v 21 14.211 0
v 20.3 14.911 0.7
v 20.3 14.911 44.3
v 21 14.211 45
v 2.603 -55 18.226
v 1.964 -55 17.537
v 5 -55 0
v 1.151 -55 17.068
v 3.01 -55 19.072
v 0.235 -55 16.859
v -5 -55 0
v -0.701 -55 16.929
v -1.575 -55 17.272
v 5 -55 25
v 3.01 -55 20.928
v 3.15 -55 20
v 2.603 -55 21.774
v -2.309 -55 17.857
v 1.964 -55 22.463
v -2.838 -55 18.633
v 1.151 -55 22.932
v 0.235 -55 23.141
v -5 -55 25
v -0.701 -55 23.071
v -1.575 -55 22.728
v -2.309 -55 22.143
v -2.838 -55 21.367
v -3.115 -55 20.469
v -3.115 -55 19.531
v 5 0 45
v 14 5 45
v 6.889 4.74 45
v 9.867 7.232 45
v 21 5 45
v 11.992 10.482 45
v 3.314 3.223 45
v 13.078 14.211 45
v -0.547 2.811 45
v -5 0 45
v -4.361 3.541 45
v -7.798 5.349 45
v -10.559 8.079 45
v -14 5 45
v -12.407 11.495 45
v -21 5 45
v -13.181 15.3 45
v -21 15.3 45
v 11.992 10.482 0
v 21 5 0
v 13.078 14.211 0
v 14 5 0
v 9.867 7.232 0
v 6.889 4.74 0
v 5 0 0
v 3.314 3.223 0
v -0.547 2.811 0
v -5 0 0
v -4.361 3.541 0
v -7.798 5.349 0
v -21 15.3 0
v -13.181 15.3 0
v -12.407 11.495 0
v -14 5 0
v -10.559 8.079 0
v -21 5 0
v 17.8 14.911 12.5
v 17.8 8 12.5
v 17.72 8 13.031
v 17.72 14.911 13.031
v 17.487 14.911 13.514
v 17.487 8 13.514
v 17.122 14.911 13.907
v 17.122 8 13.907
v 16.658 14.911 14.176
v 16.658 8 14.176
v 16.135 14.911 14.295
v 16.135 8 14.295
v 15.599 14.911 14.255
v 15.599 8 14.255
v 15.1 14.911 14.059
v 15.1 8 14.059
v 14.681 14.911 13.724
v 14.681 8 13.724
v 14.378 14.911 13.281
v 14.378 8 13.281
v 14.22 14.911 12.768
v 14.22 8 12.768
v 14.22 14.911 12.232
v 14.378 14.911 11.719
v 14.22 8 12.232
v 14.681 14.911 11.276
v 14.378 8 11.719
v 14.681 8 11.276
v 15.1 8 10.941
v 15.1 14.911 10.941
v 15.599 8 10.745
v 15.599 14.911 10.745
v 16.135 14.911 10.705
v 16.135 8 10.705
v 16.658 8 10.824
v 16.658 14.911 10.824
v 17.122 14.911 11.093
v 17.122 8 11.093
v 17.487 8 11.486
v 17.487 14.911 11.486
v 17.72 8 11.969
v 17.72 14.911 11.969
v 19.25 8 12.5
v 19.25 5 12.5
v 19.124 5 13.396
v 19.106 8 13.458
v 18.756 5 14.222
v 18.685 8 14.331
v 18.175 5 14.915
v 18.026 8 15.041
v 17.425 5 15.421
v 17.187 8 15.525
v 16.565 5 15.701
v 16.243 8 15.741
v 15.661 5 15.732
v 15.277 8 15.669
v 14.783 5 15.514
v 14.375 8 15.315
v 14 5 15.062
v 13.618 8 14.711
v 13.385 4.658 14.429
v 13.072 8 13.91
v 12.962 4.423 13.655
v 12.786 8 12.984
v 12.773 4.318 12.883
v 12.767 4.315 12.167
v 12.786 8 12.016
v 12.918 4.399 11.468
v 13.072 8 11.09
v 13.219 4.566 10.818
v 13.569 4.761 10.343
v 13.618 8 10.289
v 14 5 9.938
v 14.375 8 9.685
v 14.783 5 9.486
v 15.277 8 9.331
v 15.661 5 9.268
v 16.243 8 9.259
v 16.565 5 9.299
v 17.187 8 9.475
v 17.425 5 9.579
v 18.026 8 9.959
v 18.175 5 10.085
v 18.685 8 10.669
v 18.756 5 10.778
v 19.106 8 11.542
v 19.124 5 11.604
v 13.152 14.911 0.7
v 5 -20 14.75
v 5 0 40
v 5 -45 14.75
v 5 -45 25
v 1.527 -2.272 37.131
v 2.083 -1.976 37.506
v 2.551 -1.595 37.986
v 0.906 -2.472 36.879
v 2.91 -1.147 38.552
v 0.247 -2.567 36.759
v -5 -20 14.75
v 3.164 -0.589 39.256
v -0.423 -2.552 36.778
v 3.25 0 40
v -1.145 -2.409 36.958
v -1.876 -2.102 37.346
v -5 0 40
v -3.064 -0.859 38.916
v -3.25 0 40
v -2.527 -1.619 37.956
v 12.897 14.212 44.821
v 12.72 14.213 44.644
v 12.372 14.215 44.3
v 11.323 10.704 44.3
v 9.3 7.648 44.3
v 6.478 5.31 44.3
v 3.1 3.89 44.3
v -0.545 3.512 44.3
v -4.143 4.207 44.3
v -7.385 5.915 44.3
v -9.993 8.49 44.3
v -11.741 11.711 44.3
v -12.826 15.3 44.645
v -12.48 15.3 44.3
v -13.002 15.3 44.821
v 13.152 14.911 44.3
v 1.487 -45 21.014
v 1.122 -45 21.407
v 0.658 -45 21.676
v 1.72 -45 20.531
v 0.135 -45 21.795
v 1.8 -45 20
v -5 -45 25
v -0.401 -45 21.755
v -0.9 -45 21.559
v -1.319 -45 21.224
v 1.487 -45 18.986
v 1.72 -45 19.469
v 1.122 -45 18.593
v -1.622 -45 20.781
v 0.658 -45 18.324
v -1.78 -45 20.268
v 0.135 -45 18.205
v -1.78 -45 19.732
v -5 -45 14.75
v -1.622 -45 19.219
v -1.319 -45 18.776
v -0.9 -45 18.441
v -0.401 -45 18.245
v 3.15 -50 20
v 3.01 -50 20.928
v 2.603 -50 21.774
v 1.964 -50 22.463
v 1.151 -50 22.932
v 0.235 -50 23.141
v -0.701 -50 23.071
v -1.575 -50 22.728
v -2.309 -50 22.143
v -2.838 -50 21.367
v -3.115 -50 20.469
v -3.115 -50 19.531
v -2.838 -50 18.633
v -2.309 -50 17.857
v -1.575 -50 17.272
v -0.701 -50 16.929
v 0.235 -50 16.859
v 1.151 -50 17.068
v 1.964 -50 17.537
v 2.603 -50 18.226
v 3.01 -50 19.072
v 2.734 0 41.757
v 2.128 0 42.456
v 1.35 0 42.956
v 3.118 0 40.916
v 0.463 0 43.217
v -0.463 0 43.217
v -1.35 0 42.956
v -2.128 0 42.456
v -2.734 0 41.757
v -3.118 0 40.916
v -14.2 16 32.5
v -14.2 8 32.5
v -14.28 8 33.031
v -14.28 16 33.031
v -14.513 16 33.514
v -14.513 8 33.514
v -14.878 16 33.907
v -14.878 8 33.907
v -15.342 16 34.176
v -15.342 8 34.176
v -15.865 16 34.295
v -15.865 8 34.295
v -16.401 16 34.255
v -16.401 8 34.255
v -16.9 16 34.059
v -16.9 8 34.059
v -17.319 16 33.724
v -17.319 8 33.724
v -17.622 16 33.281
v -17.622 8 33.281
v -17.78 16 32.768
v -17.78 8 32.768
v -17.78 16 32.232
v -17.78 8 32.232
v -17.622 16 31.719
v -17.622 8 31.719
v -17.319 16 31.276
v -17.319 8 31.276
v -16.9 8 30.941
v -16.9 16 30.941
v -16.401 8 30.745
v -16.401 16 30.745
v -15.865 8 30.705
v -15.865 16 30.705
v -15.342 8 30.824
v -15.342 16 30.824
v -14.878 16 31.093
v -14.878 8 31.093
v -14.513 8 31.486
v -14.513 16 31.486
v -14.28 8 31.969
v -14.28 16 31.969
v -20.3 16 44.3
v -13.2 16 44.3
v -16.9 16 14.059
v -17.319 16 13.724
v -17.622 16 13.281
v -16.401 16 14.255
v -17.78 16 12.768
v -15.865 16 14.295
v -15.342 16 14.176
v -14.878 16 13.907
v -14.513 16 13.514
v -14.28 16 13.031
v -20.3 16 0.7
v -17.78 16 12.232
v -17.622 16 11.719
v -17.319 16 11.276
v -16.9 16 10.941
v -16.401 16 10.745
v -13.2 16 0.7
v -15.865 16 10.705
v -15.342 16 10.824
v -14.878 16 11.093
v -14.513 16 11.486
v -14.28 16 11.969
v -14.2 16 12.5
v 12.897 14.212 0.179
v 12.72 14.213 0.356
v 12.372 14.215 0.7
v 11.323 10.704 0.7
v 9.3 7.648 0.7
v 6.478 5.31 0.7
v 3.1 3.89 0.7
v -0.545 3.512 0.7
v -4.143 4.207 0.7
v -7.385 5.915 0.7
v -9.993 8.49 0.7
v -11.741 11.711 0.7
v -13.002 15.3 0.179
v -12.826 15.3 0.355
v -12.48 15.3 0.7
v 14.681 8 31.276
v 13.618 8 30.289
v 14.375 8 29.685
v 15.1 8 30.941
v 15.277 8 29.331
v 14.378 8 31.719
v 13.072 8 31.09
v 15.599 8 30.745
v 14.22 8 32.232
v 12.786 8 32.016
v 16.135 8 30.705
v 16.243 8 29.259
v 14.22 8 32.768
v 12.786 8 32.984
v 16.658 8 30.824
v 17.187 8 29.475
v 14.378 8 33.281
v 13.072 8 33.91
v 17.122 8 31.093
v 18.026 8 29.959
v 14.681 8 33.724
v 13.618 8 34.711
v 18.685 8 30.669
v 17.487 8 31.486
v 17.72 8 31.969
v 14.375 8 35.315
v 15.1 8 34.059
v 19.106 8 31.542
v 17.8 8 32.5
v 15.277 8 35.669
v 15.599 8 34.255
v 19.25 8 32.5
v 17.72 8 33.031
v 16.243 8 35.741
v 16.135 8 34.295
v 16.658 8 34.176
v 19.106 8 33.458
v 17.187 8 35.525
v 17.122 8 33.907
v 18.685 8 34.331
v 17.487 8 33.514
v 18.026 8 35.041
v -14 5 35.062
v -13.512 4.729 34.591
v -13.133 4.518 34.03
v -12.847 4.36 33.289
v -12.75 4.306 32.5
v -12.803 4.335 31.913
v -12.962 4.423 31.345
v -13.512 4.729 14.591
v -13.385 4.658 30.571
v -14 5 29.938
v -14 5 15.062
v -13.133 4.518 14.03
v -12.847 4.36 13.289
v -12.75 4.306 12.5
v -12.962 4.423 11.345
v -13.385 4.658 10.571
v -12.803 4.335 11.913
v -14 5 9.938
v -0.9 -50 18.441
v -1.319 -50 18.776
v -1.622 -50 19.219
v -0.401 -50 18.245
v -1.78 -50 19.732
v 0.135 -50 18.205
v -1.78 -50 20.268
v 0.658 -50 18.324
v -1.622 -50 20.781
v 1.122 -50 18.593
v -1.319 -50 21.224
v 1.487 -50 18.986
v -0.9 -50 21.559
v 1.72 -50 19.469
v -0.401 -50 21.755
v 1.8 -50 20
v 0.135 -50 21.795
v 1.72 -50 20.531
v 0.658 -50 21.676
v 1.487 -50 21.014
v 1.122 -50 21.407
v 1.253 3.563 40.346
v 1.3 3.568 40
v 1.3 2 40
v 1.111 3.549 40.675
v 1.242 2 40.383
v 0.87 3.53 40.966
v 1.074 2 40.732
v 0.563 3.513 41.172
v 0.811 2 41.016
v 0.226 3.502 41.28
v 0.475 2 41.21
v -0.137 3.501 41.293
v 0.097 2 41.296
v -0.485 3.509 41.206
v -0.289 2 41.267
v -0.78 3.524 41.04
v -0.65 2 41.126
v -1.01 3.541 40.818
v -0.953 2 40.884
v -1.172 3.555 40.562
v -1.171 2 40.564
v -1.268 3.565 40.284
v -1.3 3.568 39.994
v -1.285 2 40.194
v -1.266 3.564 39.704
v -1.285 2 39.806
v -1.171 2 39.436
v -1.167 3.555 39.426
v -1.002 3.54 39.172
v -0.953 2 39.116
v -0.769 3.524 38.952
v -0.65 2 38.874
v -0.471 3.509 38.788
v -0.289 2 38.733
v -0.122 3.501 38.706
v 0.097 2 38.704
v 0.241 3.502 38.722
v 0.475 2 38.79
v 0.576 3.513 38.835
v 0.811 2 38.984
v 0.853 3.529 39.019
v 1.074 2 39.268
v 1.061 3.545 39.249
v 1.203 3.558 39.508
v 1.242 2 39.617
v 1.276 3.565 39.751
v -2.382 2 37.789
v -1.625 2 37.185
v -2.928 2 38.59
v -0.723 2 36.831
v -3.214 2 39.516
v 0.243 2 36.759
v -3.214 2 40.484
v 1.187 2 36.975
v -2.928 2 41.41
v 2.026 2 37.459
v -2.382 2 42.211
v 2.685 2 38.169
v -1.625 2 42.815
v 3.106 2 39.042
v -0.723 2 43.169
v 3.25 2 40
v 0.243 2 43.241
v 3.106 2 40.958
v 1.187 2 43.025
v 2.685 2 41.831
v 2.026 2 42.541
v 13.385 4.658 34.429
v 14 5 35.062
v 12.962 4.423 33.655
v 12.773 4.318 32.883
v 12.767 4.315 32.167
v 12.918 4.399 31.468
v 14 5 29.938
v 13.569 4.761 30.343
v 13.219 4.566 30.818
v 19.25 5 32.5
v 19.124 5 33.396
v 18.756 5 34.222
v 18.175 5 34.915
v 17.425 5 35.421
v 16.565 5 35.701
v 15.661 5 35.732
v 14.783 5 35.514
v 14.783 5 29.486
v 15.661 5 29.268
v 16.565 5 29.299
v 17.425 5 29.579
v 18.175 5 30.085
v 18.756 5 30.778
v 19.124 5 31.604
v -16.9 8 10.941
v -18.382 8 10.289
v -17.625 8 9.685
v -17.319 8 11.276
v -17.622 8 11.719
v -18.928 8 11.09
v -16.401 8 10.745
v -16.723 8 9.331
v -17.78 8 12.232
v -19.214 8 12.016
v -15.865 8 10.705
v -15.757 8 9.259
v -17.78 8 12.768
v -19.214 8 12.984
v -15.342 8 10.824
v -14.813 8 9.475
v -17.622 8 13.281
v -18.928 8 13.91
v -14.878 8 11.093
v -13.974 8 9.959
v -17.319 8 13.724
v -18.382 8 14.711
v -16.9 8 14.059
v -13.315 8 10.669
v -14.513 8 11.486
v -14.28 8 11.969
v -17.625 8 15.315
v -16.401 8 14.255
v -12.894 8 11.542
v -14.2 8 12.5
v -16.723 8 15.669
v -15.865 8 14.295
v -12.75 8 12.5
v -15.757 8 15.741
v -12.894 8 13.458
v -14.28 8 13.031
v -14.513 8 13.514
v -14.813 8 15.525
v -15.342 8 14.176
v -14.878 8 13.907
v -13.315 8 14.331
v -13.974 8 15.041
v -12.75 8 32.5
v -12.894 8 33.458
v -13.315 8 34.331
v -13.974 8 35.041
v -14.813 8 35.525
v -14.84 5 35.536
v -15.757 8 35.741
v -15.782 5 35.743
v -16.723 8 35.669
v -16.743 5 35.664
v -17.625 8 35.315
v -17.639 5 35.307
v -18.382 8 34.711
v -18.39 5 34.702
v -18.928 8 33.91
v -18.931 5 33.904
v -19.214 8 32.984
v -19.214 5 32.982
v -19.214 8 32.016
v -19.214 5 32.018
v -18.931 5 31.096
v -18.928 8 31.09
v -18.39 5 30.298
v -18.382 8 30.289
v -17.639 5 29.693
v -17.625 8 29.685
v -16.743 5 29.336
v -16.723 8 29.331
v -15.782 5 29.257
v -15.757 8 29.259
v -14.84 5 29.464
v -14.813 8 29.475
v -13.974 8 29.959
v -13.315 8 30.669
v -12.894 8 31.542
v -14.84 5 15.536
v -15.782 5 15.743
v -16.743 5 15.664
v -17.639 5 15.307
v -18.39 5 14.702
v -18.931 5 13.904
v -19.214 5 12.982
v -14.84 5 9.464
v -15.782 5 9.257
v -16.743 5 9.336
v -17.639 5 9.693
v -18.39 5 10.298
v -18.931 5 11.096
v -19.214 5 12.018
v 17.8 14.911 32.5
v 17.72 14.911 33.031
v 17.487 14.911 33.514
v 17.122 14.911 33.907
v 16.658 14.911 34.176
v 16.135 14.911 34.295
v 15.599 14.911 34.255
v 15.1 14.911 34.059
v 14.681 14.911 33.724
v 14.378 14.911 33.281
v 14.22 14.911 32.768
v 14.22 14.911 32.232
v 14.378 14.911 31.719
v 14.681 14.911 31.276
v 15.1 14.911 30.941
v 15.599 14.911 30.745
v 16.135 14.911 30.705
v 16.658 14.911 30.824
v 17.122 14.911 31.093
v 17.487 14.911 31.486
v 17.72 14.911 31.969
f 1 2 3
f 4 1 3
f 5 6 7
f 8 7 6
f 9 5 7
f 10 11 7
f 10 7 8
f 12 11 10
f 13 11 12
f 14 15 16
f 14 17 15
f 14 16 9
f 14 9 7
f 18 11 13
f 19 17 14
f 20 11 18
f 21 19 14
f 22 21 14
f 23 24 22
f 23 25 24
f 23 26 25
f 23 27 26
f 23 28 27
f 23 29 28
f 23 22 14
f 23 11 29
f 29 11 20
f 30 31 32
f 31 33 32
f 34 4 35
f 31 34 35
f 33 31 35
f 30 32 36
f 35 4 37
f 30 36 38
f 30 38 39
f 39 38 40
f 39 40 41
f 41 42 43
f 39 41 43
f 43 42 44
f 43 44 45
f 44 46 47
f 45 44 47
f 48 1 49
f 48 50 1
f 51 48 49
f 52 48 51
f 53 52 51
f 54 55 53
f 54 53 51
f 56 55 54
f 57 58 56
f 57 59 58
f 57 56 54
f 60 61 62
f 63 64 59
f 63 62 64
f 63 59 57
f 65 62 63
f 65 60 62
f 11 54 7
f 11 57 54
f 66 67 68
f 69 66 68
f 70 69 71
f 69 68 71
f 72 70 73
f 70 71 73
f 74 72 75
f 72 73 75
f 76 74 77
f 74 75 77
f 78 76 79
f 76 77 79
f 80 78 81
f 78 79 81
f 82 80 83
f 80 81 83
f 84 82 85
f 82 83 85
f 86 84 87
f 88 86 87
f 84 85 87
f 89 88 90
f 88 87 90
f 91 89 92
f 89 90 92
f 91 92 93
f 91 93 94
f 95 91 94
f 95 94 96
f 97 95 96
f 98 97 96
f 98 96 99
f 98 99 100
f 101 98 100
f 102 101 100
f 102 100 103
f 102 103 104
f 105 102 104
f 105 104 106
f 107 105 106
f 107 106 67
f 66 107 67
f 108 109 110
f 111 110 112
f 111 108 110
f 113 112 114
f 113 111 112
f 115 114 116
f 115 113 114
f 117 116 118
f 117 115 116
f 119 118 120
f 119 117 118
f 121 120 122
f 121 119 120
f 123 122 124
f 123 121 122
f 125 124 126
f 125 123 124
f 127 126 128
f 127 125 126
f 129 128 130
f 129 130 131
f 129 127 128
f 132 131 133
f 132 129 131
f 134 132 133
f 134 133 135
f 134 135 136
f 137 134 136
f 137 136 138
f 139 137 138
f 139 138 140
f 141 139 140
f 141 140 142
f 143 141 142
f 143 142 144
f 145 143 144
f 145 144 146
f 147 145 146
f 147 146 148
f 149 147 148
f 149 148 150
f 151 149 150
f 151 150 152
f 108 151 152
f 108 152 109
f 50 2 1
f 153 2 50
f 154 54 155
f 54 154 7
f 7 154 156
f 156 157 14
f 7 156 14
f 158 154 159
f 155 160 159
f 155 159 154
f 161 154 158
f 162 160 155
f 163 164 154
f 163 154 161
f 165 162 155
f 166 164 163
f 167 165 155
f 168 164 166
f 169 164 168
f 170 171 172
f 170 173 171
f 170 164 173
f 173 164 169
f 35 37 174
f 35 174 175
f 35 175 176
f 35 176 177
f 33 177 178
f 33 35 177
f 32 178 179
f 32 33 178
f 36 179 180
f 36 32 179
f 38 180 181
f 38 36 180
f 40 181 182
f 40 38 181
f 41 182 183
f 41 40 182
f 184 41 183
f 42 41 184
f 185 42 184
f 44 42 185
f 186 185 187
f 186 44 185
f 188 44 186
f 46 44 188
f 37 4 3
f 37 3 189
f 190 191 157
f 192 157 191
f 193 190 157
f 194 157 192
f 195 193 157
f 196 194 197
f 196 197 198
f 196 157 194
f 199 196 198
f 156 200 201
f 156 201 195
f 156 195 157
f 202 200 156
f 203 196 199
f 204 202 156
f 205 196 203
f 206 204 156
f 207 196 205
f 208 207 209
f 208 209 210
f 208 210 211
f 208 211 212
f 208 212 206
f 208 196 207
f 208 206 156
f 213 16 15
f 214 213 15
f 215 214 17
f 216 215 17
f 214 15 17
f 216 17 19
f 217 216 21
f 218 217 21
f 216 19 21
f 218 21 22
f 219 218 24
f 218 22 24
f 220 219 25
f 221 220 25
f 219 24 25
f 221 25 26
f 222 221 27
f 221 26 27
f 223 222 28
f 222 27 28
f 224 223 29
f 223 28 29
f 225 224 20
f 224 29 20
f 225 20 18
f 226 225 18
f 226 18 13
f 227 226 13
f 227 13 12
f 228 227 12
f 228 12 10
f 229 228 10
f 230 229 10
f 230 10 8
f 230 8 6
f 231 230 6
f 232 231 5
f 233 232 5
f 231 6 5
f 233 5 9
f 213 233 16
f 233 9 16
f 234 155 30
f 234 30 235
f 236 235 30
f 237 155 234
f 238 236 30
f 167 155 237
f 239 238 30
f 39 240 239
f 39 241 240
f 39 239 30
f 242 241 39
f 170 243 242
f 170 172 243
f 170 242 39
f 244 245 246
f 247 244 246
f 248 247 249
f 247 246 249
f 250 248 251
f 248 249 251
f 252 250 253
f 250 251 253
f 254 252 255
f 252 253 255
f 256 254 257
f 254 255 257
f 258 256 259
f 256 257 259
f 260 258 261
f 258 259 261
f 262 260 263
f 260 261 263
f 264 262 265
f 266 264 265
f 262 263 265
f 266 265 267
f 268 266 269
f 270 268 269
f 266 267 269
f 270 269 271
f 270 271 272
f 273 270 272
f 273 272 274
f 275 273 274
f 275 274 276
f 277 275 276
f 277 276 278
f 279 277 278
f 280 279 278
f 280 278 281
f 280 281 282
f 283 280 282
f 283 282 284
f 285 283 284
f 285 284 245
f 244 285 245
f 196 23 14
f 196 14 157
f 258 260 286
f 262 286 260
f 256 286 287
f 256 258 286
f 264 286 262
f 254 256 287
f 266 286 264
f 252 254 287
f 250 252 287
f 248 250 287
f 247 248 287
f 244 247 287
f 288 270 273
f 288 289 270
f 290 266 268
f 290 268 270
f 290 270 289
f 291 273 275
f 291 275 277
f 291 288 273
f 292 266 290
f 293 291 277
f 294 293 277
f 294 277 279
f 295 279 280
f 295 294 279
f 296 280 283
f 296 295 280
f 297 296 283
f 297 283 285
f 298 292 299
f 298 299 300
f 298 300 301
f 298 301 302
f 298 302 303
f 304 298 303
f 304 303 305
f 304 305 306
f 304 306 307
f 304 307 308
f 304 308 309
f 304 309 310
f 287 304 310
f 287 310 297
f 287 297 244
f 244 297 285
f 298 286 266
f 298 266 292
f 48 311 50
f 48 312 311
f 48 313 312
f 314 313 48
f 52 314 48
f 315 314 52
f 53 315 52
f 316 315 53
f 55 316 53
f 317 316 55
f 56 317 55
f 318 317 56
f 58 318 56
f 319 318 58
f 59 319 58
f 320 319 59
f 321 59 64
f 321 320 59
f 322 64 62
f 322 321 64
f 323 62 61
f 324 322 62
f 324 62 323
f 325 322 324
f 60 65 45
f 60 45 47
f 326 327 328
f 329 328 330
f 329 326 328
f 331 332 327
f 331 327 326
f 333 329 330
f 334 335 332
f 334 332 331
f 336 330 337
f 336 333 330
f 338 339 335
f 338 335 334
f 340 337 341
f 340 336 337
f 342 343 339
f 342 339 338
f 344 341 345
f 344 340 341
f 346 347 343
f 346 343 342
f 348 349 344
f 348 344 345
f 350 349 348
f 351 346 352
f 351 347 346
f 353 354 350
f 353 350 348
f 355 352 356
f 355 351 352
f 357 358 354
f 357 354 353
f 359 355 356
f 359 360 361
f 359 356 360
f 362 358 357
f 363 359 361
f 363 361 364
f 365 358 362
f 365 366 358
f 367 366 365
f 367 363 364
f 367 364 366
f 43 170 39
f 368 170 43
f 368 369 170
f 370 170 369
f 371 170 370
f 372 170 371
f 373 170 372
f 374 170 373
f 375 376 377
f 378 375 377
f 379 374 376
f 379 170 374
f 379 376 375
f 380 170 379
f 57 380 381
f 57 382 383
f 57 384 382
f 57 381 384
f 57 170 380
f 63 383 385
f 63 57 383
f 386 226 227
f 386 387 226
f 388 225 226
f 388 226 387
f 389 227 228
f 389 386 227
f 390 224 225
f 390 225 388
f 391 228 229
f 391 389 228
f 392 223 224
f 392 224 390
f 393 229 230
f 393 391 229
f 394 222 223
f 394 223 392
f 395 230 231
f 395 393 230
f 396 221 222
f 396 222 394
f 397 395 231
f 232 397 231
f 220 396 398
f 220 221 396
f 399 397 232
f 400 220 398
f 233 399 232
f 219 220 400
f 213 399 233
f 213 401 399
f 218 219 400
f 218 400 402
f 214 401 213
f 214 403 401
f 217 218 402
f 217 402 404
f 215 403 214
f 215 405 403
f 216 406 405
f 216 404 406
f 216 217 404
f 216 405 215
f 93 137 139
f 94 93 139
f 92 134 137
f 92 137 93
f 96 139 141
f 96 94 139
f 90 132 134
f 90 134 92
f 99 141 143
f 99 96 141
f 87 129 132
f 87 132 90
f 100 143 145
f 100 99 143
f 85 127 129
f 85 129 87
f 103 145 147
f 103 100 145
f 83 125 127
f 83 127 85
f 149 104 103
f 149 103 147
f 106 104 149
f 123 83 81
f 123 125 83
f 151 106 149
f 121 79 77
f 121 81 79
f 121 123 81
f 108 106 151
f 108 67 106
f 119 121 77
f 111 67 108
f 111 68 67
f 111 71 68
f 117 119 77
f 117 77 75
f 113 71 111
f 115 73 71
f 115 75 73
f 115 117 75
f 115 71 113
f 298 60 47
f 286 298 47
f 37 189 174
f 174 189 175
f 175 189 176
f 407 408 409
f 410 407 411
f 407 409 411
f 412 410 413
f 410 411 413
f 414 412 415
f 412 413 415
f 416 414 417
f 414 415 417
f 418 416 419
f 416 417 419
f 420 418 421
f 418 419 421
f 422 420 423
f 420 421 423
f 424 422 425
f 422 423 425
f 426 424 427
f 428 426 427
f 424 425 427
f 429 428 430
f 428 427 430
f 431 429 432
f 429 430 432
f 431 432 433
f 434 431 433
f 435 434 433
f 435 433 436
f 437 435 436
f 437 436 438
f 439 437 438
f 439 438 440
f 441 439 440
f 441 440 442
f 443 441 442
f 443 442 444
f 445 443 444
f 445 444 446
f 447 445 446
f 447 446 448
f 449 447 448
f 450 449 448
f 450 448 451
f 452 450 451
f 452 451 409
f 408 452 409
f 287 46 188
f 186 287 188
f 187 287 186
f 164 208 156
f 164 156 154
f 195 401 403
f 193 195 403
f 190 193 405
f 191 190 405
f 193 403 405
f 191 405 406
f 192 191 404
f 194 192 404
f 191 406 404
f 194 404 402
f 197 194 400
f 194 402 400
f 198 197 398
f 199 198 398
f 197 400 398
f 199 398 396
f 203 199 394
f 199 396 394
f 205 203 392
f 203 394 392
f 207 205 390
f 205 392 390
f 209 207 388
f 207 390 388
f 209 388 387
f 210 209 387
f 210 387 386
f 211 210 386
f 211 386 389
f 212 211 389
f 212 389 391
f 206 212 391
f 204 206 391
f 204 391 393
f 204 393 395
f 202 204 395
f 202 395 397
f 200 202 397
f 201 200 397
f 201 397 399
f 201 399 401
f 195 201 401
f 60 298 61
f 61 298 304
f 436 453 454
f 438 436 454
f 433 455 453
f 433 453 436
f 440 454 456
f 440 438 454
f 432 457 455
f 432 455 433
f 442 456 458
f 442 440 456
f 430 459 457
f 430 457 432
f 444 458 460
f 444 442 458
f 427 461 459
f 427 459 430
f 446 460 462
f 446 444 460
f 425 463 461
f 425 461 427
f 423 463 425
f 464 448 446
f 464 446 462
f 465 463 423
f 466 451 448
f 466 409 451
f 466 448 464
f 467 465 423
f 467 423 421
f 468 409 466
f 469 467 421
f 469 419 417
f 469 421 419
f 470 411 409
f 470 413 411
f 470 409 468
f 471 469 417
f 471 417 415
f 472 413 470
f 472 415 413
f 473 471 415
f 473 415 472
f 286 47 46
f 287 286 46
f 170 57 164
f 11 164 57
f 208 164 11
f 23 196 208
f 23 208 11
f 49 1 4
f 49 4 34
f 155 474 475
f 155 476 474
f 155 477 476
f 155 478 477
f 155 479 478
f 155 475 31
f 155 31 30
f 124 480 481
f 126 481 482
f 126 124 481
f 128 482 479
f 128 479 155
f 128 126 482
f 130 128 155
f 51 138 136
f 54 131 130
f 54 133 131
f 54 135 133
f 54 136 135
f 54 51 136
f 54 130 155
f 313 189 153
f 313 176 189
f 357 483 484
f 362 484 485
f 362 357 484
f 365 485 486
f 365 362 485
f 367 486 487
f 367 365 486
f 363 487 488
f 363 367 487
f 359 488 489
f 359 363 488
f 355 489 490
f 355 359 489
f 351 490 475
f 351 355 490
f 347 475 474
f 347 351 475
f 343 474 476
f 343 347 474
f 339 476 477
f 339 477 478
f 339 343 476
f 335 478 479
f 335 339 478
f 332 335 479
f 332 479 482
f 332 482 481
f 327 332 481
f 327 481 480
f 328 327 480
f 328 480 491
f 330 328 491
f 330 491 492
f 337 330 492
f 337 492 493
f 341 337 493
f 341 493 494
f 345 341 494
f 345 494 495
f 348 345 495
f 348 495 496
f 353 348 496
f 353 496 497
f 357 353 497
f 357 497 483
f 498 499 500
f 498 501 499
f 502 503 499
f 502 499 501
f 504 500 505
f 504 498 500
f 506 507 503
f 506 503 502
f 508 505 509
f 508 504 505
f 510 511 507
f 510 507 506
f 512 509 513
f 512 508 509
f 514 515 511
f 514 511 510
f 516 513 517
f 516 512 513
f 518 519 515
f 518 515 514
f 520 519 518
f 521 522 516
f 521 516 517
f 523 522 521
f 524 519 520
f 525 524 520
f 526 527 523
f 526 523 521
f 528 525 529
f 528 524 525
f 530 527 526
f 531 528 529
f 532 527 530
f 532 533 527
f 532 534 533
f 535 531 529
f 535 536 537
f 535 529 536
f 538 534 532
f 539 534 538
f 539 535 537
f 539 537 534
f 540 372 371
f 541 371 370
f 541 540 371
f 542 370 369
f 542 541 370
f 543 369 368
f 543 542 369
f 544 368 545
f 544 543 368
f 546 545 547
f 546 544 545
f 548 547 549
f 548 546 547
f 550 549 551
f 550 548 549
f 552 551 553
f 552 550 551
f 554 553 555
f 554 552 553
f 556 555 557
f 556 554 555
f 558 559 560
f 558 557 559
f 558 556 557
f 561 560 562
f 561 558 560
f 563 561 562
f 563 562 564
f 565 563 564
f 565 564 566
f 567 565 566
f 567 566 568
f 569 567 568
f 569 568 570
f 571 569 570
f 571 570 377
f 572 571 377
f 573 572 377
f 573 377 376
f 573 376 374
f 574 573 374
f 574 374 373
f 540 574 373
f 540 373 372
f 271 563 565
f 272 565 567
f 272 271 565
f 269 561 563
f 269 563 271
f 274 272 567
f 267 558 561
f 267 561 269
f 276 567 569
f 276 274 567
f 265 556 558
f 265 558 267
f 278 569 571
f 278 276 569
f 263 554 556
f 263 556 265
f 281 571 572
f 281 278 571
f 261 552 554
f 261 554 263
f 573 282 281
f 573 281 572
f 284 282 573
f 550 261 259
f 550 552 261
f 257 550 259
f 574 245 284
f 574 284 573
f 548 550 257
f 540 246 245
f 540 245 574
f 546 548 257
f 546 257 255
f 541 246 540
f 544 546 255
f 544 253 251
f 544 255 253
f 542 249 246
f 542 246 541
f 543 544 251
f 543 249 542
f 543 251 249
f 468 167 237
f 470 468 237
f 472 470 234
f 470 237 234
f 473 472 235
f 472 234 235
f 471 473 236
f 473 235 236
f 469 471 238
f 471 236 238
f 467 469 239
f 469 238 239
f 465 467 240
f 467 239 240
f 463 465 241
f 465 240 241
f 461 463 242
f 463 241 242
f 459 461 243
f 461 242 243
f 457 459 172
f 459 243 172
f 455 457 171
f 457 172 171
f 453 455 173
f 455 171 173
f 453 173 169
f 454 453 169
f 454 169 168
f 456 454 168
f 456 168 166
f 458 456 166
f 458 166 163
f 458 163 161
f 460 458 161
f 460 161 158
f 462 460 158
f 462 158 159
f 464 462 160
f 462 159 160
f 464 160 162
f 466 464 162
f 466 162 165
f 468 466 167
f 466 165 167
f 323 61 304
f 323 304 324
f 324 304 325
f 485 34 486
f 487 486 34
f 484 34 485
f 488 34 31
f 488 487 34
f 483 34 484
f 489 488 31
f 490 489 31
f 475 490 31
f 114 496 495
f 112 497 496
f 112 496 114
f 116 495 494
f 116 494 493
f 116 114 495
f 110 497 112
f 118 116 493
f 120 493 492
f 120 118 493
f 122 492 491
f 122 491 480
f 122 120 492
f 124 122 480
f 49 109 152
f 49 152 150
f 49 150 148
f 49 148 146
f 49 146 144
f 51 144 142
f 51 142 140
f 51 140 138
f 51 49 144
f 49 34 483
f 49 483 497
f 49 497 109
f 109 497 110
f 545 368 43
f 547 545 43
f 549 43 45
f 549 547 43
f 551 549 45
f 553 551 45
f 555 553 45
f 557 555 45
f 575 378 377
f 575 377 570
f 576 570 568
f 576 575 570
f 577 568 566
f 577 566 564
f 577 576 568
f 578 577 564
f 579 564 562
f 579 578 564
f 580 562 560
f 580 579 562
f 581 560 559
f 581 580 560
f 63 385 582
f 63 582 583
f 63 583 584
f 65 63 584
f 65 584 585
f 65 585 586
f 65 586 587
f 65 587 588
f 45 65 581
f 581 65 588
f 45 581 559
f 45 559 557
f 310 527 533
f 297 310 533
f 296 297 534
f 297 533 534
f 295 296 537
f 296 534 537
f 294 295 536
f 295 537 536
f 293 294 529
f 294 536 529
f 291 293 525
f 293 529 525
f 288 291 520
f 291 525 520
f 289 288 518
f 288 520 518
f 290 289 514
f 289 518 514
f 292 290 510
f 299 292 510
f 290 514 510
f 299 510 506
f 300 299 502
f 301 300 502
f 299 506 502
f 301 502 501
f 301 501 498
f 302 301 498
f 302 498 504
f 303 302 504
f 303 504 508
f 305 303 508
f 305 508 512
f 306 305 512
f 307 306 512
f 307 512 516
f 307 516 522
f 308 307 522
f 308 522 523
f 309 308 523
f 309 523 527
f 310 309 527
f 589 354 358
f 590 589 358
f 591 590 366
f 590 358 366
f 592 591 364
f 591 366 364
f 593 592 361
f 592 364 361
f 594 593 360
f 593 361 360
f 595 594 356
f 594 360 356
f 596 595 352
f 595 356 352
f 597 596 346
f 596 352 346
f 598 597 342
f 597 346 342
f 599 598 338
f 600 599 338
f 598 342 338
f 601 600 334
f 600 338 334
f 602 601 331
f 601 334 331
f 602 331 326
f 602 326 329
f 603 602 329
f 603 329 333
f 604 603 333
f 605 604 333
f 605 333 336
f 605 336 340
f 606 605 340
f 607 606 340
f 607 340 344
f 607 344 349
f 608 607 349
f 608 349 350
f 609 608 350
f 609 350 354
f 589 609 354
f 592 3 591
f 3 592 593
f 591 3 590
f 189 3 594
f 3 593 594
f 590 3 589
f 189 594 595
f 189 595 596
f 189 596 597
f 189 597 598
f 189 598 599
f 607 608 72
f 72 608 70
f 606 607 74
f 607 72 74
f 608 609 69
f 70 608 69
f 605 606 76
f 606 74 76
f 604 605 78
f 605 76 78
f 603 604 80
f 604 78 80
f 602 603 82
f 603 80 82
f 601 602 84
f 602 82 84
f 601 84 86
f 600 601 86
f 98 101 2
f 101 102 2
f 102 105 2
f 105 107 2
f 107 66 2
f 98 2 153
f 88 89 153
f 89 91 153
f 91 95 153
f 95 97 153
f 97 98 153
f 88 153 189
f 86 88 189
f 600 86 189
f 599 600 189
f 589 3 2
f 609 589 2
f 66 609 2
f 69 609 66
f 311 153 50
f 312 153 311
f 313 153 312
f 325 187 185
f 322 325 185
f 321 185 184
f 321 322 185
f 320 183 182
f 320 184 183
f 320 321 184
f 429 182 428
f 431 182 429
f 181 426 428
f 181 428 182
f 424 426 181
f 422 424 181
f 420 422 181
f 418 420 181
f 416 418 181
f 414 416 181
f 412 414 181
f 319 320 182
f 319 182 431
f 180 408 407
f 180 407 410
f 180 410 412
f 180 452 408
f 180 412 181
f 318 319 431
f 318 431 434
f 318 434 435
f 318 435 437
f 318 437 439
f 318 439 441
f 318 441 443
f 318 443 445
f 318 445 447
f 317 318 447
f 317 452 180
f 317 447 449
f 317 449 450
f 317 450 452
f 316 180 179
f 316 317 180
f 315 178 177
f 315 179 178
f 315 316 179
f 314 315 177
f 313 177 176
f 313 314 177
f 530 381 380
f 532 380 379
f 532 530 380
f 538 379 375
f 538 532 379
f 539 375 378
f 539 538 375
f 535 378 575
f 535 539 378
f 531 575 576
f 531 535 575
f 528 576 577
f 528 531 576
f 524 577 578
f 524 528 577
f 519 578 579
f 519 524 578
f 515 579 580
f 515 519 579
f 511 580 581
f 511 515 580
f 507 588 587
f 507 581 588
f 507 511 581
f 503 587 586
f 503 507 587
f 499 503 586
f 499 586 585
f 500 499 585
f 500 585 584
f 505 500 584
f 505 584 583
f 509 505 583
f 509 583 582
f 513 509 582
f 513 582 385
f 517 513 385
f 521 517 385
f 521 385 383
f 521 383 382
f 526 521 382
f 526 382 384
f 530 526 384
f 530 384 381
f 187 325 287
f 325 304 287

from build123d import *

# Parameters (mm, degrees)
SKETCH018_AS_DRAWN_R                 = 3.15
EXTRUDE021_DEPTH                     = 5
EXTRUDE021_ONTO_SKETCH018_ROLL_ANGLE = 90
SKETCH007_AS_DRAWN_R                 = 1.8
EXTRUDE020_DEPTH                     = 15
EXTRUDE020_ONTO_SKETCH007_ROLL_ANGLE = 90
SKETCH005_AS_DRAWN_R                 = 1.8
SKETCH005_AS_DRAWN_R_2               = 1.3
EXTRUDE008_DEPTH                     = 40
EXTRUDE008_ONTO_SKETCH005_ROLL_ANGLE = 90
SKETCH006_AS_DRAWN_R                 = 3.25
EXTRUDE009_DEPTH                     = 4
EXTRUDE009_ONTO_SKETCH006_ROLL_ANGLE = 90
SKETCH019_AS_DRAWN_R                 = 3.25
EXTRUDE022_DEPTH                     = 10
EXTRUDE022_ONTO_SKETCH019_ROLL_ANGLE = 90
SKETCH004_R                          = 12.5
EXTRUDE007_DEPTH                     = 60
EXTRUDE001_DEPTH                     = 10
EXTRUDE_DEPTH                        = 45
CHAMFER_SIZE                         = 0.7


with BuildPart() as extrude021:
    # Sketch018 as drawn → Extrude021 (new)
    with BuildSketch(Plane.XY):
        with Locations((0, 20)):
            Circle(SKETCH018_AS_DRAWN_R)
    extrude(amount=-EXTRUDE021_DEPTH)


with BuildPart() as extrude021_1:
    # Extrude021 onto Sketch018 roll: moved
    add(extrude021.part.rotate(Axis((0, 0, 0), (1, 0, 0)), EXTRUDE021_ONTO_SKETCH018_ROLL_ANGLE))


with BuildPart() as extrude021_2:
    # Extrude021 onto Sketch018 placement: moved
    add(extrude021_1.part.moved(Location((0, -55, 0))))


with BuildPart() as bottomscrewhole:
    # Sketch007 as drawn → Extrude020 (new)
    with BuildSketch(Plane.XY):
        with Locations((0, 20)):
            Circle(SKETCH007_AS_DRAWN_R)
    extrude(amount=-EXTRUDE020_DEPTH)


with BuildPart() as bottomscrewhole_1:
    # Extrude020 onto Sketch007 roll: moved
    add(bottomscrewhole.part.rotate(Axis((0, 0, 0), (1, 0, 0)), EXTRUDE020_ONTO_SKETCH007_ROLL_ANGLE))


with BuildPart() as bottomscrewhole_2:
    # Extrude020 onto Sketch007 placement: moved
    add(bottomscrewhole_1.part.moved(Location((0, -55, 0))))

    # Fusion006: union Extrude021
    add(extrude021_2.part)


with BuildPart() as extrude008:
    # Sketch005 as drawn → Extrude008 (new)
    with BuildSketch(Plane.XY):
        with Locations((-16, 10)):
            Circle(SKETCH005_AS_DRAWN_R)
        with Locations((16, 10)):
            Circle(SKETCH005_AS_DRAWN_R)
        with Locations((16, -10)):
            Circle(SKETCH005_AS_DRAWN_R)
        with Locations((-16, -10)):
            Circle(SKETCH005_AS_DRAWN_R)
        with Locations((0, 17.5)):
            Circle(SKETCH005_AS_DRAWN_R_2)
    extrude(amount=-EXTRUDE008_DEPTH)


with BuildPart() as extrude008_1:
    # Extrude008 onto Sketch005 roll: moved
    add(extrude008.part.rotate(Axis((0, 0, 0), (1, 0, 0)), EXTRUDE008_ONTO_SKETCH005_ROLL_ANGLE))


with BuildPart() as extrude008_2:
    # Extrude008 onto Sketch005 placement: moved
    add(extrude008_1.part)


with BuildPart() as extrude008_3:
    # Extrude008 placement: moved
    add(extrude008_2.part.moved(Location((0, -20, 0))))


with BuildPart() as extrude009:
    # Sketch006 as drawn → Extrude009 (new)
    with BuildSketch(Plane.XY):
        with Locations((-16, 10)):
            Circle(SKETCH006_AS_DRAWN_R)
        with Locations((16, 10)):
            Circle(SKETCH006_AS_DRAWN_R)
        with Locations((16, -10)):
            Circle(SKETCH006_AS_DRAWN_R)
        with Locations((-16, -10)):
            Circle(SKETCH006_AS_DRAWN_R)
    extrude(amount=EXTRUDE009_DEPTH)


with BuildPart() as extrude009_1:
    # Extrude009 onto Sketch006 roll: moved
    add(extrude009.part.rotate(Axis((0, 0, 0), (1, 0, 0)), EXTRUDE009_ONTO_SKETCH006_ROLL_ANGLE))


with BuildPart() as extrude009_2:
    # Extrude009 onto Sketch006 placement: moved
    add(extrude009_1.part)


with BuildPart() as extrude009_3:
    # Extrude009 placement: moved
    add(extrude009_2.part.moved(Location((0, 8, 0))))


with BuildPart() as screwholes:
    # Sketch019 as drawn → Extrude022 (new)
    with BuildSketch(Plane.XY):
        with Locations((0, 17.5)):
            Circle(SKETCH019_AS_DRAWN_R)
    extrude(amount=-EXTRUDE022_DEPTH)


with BuildPart() as screwholes_1:
    # Extrude022 onto Sketch019 roll: moved
    add(screwholes.part.rotate(Axis((0, 0, 0), (1, 0, 0)), EXTRUDE022_ONTO_SKETCH019_ROLL_ANGLE))


with BuildPart() as screwholes_2:
    # Extrude022 onto Sketch019 placement: moved
    add(screwholes_1.part)


with BuildPart() as screwholes_3:
    # Extrude022 placement: moved
    add(screwholes_2.part.moved(Location((0, -8, 0))))

    # Fusion007: union Extrude008, Extrude009
    add(extrude008_3.part)
    add(extrude009_3.part)


with BuildPart() as screwholes_4:
    # Fusion007 placement: moved
    add(screwholes_3.part.moved(Location((0, 0, 22.5))))


with BuildPart() as tube:
    # Sketch004 → Extrude007 (new body)
    with BuildSketch(Plane(origin=(0, 16, 0), x_dir=(1, 0, 0), z_dir=(0, 0, 1))):
        Circle(SKETCH004_R)
    extrude(amount=EXTRUDE007_DEPTH)


with BuildPart() as tube_1:
    # Extrude007 placement: moved
    add(tube.part.moved(Location((0, 0, -12.5))))


with BuildPart() as extrude001:
    # Sketch → Extrude001 (new body)
    with BuildSketch(Plane.YZ):
        Polygon((0, 40), (0, 0), (-55, 0), (-55, 25), (-45, 25), (-45, 14.75), (-20, 14.75), align=None)
    extrude(amount=EXTRUDE001_DEPTH)


with BuildPart() as extrude001_1:
    # Extrude001 placement: moved
    add(extrude001.part.moved(Location((-5, 0, 0))))


with BuildPart() as chamfer_body:
    # Sketch003 → Extrude (new body)
    with BuildSketch(Plane.XY):
        Polygon((21, 14.910553), (21, 5), (14, 5), (5, 0), (-5, 0), (-14, 5), (-21, 5), (-21, 16), (-12.5, 16), (-11.410553, 14.910553), (12.452434, 14.910553), align=None)
    extrude(amount=EXTRUDE_DEPTH)

    # Fusion: union Extrude001
    add(extrude001_1.part)

    # Cut: cut tube
    add(tube_1.part, mode=Mode.SUBTRACT)

    # Cut001: cut ScrewHoles
    add(screwholes_4.part, mode=Mode.SUBTRACT)

    # Cut002: cut BottomScrewHole
    add(bottomscrewhole_2.part, mode=Mode.SUBTRACT)

    # Chamfer
    chamfer_edges = [chamfer_body.edges().sort_by_distance(p)[0] for p in [
        (12.452434, 14.910553, 22.5),
        (16.726217, 14.910553, 0),
        (16.726217, 14.910553, 45),
        (21, 14.910553, 22.5),
        (-0.545242, 3.511897, 0),
        (-0.545242, 3.511897, 45),
        (-12.5, 16, 22.5),
        (-16.75, 16, 0),
        (-16.75, 16, 45),
        (-21, 16, 22.5),
    ]]
    chamfer(chamfer_edges, length=CHAMFER_SIZE)


solid = chamfer_body.part
